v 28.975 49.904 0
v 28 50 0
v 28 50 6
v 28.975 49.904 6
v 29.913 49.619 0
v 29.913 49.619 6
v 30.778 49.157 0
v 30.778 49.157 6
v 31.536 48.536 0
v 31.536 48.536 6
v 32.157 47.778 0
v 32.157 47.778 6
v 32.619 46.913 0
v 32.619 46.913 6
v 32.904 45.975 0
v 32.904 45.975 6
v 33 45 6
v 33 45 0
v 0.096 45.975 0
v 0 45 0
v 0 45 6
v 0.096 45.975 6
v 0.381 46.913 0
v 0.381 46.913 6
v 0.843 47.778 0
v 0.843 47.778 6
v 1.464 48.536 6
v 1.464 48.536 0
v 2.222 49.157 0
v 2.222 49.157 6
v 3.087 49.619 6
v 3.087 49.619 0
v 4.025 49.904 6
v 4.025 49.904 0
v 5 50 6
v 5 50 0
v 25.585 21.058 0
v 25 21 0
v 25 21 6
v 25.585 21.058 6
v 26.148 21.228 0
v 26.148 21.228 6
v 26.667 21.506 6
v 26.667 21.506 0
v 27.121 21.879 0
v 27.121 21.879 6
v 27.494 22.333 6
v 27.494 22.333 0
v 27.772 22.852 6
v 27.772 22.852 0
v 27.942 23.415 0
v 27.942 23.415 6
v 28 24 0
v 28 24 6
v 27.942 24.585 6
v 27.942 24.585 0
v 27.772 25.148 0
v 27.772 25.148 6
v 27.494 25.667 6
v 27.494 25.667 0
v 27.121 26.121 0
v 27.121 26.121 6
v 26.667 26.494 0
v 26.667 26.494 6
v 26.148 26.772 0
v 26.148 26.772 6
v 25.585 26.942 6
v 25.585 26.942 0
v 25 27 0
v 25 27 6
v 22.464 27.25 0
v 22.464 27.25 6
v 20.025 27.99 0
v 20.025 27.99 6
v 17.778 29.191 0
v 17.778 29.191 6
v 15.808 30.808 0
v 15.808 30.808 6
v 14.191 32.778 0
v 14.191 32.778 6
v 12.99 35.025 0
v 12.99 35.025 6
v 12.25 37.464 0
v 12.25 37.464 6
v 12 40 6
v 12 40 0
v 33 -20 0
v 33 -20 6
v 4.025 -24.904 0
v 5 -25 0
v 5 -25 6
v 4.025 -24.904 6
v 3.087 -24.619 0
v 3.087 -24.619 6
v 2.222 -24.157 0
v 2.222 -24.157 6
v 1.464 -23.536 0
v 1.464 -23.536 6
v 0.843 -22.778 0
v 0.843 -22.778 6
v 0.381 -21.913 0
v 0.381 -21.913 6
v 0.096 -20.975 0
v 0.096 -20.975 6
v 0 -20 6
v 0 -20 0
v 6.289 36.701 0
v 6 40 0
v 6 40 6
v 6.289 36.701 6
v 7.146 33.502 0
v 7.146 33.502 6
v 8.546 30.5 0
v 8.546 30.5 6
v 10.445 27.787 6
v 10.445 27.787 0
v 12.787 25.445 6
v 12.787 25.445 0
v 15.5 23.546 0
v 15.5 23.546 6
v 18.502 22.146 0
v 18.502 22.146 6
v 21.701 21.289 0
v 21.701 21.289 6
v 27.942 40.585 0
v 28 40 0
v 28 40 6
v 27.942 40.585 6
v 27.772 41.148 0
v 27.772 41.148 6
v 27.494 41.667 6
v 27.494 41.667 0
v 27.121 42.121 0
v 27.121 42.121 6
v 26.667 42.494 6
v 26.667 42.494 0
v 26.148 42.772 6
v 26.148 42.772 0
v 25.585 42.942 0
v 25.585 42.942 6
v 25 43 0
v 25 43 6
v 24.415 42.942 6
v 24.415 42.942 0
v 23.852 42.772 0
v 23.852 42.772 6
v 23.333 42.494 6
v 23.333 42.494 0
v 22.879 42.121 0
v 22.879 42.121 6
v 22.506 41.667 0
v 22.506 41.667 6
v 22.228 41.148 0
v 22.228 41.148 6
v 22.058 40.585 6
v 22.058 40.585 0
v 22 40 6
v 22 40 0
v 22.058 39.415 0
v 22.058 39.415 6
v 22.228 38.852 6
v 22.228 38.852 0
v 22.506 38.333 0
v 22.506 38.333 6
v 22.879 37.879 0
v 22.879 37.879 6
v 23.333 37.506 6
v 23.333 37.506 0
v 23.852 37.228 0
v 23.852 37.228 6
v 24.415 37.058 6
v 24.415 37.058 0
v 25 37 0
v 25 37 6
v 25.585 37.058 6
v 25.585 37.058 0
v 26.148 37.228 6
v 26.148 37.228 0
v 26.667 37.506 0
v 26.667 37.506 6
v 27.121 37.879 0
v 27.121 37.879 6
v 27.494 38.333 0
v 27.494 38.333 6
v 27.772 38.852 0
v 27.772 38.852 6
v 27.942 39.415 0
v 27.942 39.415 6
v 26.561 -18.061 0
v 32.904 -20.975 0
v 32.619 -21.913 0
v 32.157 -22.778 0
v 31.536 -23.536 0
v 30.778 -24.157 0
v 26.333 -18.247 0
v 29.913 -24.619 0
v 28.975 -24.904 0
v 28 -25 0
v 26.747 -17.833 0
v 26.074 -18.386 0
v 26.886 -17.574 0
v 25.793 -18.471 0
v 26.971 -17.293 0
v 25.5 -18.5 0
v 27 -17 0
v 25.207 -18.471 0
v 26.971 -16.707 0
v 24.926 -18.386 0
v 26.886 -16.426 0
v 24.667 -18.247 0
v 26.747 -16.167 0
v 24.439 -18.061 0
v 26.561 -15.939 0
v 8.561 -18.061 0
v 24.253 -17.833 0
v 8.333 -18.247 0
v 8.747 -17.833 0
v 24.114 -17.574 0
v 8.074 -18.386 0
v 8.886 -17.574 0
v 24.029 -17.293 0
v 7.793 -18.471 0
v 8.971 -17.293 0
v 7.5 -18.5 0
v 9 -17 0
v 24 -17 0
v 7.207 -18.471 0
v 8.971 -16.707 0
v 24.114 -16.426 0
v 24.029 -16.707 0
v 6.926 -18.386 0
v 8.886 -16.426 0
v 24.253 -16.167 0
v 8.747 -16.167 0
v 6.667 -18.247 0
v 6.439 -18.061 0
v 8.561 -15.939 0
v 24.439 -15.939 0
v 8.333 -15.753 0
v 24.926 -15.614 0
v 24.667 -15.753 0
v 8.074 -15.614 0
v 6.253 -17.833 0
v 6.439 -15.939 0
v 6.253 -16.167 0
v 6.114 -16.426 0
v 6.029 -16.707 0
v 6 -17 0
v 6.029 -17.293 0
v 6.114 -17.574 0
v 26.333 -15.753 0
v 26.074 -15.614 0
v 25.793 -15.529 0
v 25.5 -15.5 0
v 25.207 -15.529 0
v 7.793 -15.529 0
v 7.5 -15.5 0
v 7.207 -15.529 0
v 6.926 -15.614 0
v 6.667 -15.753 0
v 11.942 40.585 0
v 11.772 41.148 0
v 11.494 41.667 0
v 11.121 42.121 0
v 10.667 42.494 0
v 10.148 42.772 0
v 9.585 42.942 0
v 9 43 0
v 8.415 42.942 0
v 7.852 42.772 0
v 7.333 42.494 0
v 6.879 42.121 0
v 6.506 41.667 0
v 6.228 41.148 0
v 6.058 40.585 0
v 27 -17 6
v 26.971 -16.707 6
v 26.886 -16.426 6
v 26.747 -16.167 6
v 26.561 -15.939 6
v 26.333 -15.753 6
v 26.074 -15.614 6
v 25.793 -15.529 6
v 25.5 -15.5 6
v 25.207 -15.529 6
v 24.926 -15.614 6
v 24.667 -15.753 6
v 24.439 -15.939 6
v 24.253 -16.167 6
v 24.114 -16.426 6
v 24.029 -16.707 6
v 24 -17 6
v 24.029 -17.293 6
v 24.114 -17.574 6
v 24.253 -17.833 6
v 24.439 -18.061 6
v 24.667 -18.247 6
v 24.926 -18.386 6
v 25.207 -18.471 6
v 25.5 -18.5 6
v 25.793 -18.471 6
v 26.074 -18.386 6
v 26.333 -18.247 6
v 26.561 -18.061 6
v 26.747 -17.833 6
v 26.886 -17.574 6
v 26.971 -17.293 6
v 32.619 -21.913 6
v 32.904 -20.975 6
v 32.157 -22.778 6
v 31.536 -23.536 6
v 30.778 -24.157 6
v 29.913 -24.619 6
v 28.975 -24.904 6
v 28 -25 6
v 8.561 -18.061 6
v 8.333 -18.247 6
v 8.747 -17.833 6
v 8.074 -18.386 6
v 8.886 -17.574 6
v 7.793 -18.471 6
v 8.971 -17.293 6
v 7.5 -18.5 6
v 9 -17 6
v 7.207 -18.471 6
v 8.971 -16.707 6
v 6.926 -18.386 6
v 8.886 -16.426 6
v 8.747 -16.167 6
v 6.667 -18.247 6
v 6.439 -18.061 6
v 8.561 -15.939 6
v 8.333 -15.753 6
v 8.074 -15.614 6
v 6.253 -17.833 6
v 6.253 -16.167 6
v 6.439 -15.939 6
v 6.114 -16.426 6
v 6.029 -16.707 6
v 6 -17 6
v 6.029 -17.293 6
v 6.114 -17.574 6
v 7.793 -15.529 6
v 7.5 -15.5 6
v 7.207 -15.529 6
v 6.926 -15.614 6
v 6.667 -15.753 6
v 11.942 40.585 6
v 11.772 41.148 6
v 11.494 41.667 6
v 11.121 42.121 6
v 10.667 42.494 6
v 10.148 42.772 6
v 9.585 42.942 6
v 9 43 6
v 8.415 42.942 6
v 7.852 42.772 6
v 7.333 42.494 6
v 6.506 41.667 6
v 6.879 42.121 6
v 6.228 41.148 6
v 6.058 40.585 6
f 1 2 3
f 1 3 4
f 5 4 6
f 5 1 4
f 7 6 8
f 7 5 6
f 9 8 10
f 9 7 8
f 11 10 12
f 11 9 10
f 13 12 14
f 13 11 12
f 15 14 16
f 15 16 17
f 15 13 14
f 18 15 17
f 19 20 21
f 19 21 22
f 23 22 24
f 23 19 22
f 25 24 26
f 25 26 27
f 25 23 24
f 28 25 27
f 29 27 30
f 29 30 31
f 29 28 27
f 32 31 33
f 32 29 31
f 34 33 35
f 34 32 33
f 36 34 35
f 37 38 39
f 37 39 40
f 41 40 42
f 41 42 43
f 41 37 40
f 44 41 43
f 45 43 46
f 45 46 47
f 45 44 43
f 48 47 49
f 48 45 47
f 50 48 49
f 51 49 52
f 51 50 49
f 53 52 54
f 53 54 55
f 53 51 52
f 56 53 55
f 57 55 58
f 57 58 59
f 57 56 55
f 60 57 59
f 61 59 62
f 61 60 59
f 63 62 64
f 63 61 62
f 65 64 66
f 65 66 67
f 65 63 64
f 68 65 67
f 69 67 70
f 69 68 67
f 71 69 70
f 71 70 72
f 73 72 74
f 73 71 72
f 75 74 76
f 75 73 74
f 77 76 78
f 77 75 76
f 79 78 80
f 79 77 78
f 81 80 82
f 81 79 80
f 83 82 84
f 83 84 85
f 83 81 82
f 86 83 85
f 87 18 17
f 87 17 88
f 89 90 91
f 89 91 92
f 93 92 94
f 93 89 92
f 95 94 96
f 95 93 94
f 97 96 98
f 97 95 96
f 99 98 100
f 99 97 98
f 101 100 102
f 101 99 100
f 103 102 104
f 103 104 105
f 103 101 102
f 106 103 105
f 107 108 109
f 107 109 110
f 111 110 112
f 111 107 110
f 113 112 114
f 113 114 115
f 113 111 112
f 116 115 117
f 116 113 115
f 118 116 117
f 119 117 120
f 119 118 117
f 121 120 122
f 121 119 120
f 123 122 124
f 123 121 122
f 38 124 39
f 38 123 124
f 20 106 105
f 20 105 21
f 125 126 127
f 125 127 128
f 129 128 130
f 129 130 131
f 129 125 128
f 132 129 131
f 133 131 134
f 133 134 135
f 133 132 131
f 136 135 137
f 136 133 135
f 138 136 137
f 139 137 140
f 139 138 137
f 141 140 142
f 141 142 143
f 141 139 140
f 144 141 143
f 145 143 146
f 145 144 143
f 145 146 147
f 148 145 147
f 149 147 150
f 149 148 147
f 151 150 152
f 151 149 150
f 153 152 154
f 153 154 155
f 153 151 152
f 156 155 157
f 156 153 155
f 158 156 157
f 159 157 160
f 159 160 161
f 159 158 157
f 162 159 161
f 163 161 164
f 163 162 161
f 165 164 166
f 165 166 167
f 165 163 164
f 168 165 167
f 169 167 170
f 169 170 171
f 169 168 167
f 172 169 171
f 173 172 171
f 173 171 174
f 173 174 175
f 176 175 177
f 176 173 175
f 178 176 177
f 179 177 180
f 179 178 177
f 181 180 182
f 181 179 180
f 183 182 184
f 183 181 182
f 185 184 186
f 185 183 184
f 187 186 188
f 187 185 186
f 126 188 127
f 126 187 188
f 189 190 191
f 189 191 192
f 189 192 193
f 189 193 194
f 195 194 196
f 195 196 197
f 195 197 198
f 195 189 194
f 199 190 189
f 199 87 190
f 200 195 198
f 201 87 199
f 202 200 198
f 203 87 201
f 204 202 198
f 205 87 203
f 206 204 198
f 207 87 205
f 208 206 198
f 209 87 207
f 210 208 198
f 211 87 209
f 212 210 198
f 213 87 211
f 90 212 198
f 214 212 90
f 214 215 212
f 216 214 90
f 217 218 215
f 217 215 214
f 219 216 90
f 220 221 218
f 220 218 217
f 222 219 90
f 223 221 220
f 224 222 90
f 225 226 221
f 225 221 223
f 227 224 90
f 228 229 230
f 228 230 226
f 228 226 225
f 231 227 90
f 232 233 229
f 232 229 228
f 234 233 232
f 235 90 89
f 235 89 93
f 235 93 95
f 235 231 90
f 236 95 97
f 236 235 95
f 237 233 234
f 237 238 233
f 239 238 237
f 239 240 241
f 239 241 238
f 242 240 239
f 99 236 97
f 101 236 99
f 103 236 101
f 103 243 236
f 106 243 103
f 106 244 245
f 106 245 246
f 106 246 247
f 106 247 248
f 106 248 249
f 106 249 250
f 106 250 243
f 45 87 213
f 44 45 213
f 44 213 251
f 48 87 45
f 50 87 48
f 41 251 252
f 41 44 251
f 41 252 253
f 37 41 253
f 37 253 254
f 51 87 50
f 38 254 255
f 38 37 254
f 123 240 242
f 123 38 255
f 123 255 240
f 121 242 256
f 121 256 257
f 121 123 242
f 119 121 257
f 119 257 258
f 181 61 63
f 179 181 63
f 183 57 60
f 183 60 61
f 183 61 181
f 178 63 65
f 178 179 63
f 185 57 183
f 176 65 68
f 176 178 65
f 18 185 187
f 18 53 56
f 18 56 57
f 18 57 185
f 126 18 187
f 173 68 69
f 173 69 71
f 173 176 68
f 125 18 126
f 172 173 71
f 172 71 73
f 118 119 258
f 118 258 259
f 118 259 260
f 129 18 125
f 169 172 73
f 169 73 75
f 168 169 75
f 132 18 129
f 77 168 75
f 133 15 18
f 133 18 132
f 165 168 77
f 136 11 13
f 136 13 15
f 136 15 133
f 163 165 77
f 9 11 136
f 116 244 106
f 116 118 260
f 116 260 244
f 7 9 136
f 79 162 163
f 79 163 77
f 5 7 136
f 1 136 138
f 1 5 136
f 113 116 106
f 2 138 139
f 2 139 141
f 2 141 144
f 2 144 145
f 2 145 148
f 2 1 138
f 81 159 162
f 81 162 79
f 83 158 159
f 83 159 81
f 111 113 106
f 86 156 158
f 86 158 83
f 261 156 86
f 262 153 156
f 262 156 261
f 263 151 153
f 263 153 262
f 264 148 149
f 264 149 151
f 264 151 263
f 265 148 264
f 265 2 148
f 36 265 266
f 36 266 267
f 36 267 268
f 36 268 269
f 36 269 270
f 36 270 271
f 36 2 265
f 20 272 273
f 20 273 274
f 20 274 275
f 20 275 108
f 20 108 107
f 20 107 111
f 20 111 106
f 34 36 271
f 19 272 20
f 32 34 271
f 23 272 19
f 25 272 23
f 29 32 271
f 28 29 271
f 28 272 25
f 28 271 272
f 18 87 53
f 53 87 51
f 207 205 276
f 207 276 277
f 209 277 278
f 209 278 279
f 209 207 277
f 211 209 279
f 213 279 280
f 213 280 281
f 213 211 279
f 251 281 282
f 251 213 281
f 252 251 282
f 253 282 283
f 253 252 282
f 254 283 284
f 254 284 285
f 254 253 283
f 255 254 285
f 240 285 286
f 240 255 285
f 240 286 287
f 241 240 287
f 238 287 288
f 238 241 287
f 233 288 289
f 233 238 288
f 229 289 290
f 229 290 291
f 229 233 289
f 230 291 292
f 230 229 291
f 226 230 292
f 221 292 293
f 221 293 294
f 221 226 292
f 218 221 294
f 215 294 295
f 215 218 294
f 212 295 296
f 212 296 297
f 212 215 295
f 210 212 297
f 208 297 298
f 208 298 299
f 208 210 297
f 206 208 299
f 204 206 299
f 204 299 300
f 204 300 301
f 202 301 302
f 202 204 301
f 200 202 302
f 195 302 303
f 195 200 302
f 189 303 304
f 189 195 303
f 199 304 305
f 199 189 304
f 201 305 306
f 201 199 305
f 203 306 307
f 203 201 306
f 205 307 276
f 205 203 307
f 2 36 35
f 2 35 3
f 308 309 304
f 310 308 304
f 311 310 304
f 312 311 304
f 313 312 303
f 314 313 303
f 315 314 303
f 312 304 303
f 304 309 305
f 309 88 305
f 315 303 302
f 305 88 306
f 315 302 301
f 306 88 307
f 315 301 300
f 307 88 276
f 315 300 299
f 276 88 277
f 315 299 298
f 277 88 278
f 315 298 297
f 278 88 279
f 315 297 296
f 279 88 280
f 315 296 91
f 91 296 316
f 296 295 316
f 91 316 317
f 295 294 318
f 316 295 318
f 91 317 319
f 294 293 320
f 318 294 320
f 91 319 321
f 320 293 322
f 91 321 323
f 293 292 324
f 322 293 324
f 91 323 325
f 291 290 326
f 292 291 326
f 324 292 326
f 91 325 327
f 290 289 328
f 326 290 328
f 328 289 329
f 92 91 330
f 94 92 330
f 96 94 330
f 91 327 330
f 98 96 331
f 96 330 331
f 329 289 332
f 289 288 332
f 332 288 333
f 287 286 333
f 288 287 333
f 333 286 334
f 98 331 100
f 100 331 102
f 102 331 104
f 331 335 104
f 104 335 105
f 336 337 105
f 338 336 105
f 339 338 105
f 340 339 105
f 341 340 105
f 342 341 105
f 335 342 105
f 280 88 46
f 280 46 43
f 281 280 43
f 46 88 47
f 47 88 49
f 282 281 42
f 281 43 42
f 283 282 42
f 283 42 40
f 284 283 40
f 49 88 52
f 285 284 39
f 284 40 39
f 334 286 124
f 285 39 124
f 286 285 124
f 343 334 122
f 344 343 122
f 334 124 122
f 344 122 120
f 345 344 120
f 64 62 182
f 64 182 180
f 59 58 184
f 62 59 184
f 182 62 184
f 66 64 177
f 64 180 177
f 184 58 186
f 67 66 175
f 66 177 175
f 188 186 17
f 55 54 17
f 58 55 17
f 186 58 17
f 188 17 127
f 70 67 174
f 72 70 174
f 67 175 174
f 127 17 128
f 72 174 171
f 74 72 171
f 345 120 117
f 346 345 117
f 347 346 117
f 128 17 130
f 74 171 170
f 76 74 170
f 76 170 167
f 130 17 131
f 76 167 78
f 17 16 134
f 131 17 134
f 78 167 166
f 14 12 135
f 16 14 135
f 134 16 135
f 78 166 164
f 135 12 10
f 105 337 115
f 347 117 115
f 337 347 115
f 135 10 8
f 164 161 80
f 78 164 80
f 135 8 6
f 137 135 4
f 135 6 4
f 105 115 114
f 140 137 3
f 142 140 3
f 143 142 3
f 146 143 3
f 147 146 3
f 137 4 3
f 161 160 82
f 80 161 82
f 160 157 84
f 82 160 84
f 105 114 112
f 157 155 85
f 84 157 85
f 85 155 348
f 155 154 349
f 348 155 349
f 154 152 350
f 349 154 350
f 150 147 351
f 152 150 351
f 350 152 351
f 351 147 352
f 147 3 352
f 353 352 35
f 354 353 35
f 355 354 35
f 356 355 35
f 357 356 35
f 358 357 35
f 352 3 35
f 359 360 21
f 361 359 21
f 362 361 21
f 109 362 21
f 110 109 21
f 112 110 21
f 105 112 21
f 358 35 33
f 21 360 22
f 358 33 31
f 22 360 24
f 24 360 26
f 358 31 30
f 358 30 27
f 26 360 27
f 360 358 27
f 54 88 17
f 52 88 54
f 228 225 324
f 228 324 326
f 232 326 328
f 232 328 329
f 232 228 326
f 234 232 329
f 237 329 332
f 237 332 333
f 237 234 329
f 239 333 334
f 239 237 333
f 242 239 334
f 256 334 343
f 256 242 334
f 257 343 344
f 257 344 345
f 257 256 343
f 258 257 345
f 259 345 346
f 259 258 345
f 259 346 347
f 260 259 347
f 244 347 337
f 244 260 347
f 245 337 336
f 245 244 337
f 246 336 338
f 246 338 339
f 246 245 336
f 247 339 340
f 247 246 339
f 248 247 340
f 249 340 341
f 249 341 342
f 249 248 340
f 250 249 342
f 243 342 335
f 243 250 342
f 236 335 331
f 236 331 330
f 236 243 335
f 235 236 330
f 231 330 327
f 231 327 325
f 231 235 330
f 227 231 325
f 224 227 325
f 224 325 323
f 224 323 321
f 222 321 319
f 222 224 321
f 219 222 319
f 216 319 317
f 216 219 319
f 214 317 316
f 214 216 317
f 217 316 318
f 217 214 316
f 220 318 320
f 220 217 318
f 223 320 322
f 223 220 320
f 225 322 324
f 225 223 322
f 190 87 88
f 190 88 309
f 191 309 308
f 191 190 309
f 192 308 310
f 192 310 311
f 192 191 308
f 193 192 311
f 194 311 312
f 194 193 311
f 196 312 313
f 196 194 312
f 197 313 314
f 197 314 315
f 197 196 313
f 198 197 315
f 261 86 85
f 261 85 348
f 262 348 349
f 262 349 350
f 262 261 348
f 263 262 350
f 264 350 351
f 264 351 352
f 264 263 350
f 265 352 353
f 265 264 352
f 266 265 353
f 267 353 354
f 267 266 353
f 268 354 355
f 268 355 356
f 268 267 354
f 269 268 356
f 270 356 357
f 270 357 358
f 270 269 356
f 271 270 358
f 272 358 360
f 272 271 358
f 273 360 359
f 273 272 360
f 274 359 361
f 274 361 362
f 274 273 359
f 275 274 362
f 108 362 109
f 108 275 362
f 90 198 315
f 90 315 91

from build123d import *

# Parameters (mm, degrees)
ESBO_O1_R                = 3
ESBO_O1_R_2              = 1.5
RESSALTO_EXTRUS_O2_DEPTH = 6


with BuildPart() as part:
    # Esboço1 → Ressalto-extrusão2 (new body)
    with BuildSketch(Plane.XY):
        with BuildLine():
            Line((5, 50), (28, 50))
            ThreePointArc((28, 50), (31.535533906, 48.535533906), (33, 45))
            Line((33, 45), (33, -20))
            ThreePointArc((33, -20), (31.535533906, -23.535533906), (28, -25))
            Line((28, -25), (5, -25))
            ThreePointArc((5, -25), (1.464466094, -23.535533906), (0, -20))
            Line((0, -20), (0, 45))
            ThreePointArc((0, 45), (1.464466094, 48.535533906), (5, 50))
        make_face()
        with Locations((25, 40)):
            Circle(ESBO_O1_R, mode=Mode.SUBTRACT)
        with Locations((25.5, -17)):
            Circle(ESBO_O1_R_2, mode=Mode.SUBTRACT)
        with Locations((7.5, -17)):
            Circle(ESBO_O1_R_2, mode=Mode.SUBTRACT)
        with BuildLine():
            ThreePointArc((6, 40), (11.564971157, 26.564971157), (25, 21))
            ThreePointArc((25, 21), (28, 24), (25, 27))
            ThreePointArc((25, 27), (15.807611845, 30.807611845), (12, 40))
            ThreePointArc((12, 40), (9, 43), (6, 40))
        make_face(mode=Mode.SUBTRACT)
    extrude(amount=RESSALTO_EXTRUS_O2_DEPTH)


solid = part.part
